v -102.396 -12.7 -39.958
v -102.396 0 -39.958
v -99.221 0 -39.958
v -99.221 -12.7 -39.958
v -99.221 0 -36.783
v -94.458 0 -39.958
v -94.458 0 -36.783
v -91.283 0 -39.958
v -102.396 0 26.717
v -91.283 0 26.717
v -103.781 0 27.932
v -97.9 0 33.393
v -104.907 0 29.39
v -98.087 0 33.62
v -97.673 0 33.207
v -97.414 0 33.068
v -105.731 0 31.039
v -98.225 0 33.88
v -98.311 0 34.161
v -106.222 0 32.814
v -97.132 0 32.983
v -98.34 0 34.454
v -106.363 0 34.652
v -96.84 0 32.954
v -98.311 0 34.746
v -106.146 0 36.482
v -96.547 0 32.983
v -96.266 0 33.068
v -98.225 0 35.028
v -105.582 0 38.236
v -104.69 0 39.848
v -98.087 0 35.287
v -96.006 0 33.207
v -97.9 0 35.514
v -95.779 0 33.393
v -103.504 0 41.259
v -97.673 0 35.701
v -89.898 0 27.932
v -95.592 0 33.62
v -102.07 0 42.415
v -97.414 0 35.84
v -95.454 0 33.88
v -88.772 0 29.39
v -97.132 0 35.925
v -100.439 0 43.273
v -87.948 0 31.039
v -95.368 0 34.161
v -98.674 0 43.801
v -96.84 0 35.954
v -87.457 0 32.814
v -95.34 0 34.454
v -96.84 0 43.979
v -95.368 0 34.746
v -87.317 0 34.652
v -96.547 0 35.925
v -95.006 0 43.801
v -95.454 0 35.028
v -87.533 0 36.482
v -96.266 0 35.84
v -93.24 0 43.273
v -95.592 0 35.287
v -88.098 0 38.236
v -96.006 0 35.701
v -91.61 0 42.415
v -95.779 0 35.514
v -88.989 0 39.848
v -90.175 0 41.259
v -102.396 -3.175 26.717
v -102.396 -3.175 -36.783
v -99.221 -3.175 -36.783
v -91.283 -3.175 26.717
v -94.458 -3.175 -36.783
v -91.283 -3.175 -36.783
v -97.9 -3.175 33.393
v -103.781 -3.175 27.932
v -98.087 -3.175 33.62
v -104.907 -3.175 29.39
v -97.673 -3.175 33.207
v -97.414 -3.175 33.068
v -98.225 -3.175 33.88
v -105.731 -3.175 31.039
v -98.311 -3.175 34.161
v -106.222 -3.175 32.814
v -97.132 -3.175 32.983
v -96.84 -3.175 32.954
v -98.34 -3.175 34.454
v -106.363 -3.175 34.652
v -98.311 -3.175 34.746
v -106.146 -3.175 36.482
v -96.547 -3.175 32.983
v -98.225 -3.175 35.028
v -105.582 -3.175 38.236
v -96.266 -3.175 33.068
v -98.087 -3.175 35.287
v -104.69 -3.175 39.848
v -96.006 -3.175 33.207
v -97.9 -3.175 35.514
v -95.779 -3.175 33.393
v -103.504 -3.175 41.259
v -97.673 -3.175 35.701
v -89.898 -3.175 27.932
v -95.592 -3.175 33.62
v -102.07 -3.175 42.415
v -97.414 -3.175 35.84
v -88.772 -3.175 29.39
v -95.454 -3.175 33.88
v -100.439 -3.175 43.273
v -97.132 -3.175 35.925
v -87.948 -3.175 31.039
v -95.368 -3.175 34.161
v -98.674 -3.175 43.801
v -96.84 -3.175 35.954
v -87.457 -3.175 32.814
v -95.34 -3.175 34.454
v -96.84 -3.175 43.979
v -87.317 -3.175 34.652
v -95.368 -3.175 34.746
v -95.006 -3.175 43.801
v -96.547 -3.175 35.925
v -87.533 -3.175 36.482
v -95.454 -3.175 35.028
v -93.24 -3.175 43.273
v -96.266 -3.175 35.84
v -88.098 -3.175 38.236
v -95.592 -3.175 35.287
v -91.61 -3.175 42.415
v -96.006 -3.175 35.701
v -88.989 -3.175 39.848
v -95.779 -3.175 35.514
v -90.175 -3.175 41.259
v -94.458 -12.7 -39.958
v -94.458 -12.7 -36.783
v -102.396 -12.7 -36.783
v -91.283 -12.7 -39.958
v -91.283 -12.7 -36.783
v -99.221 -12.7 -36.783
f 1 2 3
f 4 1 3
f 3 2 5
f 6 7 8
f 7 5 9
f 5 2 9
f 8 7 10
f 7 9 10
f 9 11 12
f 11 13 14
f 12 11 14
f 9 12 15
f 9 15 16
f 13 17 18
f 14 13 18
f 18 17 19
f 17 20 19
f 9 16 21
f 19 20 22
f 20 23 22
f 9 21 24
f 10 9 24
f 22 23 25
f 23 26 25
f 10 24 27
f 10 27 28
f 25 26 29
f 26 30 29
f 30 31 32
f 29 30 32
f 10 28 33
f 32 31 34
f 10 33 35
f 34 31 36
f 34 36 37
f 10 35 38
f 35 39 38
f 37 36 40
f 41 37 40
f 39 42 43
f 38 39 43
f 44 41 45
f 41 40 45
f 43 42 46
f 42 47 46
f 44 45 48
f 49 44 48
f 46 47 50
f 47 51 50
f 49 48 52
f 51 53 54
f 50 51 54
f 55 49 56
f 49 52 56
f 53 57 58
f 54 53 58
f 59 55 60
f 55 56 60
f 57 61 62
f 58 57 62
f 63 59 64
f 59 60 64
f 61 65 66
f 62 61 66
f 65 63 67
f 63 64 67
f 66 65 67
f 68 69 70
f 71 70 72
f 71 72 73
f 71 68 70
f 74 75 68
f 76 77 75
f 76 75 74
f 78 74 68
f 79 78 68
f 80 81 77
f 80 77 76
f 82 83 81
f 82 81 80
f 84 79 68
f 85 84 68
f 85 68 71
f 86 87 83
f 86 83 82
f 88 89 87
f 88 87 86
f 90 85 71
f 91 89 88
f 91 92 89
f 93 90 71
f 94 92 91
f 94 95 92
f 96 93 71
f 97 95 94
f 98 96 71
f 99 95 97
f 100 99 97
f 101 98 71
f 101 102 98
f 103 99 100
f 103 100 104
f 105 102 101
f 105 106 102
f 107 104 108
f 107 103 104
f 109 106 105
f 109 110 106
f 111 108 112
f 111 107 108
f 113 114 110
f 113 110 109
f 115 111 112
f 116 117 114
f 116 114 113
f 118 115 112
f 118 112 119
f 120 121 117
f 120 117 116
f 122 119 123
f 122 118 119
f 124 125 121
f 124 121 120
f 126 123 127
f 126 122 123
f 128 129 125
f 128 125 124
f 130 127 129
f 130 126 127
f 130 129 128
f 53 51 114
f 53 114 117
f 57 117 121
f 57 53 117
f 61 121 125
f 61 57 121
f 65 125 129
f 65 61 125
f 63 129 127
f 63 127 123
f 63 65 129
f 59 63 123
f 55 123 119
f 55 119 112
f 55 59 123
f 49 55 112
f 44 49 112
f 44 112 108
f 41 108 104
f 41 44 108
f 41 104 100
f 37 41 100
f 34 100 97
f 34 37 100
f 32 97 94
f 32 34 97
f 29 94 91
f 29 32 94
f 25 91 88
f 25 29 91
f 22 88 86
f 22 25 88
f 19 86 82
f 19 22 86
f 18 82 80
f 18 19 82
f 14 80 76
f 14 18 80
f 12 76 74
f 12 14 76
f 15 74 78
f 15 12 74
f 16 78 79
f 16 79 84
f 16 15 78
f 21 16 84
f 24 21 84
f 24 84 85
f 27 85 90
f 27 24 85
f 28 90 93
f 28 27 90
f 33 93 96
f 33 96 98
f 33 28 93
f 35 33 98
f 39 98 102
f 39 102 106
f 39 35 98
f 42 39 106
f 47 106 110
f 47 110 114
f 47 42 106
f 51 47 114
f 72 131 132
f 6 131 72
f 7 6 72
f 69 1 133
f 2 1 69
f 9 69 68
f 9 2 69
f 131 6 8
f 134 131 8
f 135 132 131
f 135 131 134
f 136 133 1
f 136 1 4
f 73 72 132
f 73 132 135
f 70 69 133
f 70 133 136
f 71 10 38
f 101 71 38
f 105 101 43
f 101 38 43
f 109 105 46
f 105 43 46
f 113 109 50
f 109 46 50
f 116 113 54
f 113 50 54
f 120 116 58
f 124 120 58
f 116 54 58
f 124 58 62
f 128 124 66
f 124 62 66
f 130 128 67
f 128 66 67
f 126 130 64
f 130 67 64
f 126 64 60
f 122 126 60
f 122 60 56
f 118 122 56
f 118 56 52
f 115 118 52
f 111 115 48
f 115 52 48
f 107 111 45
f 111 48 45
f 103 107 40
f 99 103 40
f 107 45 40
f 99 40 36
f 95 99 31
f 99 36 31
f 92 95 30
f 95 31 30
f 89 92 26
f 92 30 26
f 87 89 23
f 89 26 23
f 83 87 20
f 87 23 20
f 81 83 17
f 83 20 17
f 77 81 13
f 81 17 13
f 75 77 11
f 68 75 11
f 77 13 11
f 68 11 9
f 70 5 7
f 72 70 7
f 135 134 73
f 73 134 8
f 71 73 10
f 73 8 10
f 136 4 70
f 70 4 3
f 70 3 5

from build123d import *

# Parameters (mm, degrees)
F0_R     = 1.5
F1_DEPTH = 3.175
F0_W     = 3.175
F0_H     = 3.175
F2_DEPTH = 12.7


with BuildPart() as f1:
    # F0 (on Front) → F1 (new body)
    with BuildSketch(Plane.XZ):
        with BuildLine():
            Line((-91.283362, -36.782738), (-91.283362, 26.717262))
            ThreePointArc((-91.283362, 26.717262), (-96.839612, 43.97878), (-102.395862, 26.717262))
            Line((-102.395862, 26.717262), (-102.395862, -36.782738))
            Line((-102.395862, -36.782738), (-99.220862, -36.782738))
            Line((-99.220862, -36.782738), (-94.458362, -36.782738))
            Line((-94.458362, -36.782738), (-91.283362, -36.782738))
        make_face()
        with Locations((-96.839612, 34.45378)):
            Circle(F0_R, mode=Mode.SUBTRACT)
    extrude(amount=F1_DEPTH)

    # F0 (on Front) → F2 (join)
    with BuildSketch(Plane.XZ):
        with Locations((-100.808362, -38.370238)):
            Rectangle(F0_W, F0_H)
        with Locations((-92.870862, -38.370238)):
            Rectangle(F0_W, F0_H)
    extrude(amount=F2_DEPTH)


solid = f1.part
